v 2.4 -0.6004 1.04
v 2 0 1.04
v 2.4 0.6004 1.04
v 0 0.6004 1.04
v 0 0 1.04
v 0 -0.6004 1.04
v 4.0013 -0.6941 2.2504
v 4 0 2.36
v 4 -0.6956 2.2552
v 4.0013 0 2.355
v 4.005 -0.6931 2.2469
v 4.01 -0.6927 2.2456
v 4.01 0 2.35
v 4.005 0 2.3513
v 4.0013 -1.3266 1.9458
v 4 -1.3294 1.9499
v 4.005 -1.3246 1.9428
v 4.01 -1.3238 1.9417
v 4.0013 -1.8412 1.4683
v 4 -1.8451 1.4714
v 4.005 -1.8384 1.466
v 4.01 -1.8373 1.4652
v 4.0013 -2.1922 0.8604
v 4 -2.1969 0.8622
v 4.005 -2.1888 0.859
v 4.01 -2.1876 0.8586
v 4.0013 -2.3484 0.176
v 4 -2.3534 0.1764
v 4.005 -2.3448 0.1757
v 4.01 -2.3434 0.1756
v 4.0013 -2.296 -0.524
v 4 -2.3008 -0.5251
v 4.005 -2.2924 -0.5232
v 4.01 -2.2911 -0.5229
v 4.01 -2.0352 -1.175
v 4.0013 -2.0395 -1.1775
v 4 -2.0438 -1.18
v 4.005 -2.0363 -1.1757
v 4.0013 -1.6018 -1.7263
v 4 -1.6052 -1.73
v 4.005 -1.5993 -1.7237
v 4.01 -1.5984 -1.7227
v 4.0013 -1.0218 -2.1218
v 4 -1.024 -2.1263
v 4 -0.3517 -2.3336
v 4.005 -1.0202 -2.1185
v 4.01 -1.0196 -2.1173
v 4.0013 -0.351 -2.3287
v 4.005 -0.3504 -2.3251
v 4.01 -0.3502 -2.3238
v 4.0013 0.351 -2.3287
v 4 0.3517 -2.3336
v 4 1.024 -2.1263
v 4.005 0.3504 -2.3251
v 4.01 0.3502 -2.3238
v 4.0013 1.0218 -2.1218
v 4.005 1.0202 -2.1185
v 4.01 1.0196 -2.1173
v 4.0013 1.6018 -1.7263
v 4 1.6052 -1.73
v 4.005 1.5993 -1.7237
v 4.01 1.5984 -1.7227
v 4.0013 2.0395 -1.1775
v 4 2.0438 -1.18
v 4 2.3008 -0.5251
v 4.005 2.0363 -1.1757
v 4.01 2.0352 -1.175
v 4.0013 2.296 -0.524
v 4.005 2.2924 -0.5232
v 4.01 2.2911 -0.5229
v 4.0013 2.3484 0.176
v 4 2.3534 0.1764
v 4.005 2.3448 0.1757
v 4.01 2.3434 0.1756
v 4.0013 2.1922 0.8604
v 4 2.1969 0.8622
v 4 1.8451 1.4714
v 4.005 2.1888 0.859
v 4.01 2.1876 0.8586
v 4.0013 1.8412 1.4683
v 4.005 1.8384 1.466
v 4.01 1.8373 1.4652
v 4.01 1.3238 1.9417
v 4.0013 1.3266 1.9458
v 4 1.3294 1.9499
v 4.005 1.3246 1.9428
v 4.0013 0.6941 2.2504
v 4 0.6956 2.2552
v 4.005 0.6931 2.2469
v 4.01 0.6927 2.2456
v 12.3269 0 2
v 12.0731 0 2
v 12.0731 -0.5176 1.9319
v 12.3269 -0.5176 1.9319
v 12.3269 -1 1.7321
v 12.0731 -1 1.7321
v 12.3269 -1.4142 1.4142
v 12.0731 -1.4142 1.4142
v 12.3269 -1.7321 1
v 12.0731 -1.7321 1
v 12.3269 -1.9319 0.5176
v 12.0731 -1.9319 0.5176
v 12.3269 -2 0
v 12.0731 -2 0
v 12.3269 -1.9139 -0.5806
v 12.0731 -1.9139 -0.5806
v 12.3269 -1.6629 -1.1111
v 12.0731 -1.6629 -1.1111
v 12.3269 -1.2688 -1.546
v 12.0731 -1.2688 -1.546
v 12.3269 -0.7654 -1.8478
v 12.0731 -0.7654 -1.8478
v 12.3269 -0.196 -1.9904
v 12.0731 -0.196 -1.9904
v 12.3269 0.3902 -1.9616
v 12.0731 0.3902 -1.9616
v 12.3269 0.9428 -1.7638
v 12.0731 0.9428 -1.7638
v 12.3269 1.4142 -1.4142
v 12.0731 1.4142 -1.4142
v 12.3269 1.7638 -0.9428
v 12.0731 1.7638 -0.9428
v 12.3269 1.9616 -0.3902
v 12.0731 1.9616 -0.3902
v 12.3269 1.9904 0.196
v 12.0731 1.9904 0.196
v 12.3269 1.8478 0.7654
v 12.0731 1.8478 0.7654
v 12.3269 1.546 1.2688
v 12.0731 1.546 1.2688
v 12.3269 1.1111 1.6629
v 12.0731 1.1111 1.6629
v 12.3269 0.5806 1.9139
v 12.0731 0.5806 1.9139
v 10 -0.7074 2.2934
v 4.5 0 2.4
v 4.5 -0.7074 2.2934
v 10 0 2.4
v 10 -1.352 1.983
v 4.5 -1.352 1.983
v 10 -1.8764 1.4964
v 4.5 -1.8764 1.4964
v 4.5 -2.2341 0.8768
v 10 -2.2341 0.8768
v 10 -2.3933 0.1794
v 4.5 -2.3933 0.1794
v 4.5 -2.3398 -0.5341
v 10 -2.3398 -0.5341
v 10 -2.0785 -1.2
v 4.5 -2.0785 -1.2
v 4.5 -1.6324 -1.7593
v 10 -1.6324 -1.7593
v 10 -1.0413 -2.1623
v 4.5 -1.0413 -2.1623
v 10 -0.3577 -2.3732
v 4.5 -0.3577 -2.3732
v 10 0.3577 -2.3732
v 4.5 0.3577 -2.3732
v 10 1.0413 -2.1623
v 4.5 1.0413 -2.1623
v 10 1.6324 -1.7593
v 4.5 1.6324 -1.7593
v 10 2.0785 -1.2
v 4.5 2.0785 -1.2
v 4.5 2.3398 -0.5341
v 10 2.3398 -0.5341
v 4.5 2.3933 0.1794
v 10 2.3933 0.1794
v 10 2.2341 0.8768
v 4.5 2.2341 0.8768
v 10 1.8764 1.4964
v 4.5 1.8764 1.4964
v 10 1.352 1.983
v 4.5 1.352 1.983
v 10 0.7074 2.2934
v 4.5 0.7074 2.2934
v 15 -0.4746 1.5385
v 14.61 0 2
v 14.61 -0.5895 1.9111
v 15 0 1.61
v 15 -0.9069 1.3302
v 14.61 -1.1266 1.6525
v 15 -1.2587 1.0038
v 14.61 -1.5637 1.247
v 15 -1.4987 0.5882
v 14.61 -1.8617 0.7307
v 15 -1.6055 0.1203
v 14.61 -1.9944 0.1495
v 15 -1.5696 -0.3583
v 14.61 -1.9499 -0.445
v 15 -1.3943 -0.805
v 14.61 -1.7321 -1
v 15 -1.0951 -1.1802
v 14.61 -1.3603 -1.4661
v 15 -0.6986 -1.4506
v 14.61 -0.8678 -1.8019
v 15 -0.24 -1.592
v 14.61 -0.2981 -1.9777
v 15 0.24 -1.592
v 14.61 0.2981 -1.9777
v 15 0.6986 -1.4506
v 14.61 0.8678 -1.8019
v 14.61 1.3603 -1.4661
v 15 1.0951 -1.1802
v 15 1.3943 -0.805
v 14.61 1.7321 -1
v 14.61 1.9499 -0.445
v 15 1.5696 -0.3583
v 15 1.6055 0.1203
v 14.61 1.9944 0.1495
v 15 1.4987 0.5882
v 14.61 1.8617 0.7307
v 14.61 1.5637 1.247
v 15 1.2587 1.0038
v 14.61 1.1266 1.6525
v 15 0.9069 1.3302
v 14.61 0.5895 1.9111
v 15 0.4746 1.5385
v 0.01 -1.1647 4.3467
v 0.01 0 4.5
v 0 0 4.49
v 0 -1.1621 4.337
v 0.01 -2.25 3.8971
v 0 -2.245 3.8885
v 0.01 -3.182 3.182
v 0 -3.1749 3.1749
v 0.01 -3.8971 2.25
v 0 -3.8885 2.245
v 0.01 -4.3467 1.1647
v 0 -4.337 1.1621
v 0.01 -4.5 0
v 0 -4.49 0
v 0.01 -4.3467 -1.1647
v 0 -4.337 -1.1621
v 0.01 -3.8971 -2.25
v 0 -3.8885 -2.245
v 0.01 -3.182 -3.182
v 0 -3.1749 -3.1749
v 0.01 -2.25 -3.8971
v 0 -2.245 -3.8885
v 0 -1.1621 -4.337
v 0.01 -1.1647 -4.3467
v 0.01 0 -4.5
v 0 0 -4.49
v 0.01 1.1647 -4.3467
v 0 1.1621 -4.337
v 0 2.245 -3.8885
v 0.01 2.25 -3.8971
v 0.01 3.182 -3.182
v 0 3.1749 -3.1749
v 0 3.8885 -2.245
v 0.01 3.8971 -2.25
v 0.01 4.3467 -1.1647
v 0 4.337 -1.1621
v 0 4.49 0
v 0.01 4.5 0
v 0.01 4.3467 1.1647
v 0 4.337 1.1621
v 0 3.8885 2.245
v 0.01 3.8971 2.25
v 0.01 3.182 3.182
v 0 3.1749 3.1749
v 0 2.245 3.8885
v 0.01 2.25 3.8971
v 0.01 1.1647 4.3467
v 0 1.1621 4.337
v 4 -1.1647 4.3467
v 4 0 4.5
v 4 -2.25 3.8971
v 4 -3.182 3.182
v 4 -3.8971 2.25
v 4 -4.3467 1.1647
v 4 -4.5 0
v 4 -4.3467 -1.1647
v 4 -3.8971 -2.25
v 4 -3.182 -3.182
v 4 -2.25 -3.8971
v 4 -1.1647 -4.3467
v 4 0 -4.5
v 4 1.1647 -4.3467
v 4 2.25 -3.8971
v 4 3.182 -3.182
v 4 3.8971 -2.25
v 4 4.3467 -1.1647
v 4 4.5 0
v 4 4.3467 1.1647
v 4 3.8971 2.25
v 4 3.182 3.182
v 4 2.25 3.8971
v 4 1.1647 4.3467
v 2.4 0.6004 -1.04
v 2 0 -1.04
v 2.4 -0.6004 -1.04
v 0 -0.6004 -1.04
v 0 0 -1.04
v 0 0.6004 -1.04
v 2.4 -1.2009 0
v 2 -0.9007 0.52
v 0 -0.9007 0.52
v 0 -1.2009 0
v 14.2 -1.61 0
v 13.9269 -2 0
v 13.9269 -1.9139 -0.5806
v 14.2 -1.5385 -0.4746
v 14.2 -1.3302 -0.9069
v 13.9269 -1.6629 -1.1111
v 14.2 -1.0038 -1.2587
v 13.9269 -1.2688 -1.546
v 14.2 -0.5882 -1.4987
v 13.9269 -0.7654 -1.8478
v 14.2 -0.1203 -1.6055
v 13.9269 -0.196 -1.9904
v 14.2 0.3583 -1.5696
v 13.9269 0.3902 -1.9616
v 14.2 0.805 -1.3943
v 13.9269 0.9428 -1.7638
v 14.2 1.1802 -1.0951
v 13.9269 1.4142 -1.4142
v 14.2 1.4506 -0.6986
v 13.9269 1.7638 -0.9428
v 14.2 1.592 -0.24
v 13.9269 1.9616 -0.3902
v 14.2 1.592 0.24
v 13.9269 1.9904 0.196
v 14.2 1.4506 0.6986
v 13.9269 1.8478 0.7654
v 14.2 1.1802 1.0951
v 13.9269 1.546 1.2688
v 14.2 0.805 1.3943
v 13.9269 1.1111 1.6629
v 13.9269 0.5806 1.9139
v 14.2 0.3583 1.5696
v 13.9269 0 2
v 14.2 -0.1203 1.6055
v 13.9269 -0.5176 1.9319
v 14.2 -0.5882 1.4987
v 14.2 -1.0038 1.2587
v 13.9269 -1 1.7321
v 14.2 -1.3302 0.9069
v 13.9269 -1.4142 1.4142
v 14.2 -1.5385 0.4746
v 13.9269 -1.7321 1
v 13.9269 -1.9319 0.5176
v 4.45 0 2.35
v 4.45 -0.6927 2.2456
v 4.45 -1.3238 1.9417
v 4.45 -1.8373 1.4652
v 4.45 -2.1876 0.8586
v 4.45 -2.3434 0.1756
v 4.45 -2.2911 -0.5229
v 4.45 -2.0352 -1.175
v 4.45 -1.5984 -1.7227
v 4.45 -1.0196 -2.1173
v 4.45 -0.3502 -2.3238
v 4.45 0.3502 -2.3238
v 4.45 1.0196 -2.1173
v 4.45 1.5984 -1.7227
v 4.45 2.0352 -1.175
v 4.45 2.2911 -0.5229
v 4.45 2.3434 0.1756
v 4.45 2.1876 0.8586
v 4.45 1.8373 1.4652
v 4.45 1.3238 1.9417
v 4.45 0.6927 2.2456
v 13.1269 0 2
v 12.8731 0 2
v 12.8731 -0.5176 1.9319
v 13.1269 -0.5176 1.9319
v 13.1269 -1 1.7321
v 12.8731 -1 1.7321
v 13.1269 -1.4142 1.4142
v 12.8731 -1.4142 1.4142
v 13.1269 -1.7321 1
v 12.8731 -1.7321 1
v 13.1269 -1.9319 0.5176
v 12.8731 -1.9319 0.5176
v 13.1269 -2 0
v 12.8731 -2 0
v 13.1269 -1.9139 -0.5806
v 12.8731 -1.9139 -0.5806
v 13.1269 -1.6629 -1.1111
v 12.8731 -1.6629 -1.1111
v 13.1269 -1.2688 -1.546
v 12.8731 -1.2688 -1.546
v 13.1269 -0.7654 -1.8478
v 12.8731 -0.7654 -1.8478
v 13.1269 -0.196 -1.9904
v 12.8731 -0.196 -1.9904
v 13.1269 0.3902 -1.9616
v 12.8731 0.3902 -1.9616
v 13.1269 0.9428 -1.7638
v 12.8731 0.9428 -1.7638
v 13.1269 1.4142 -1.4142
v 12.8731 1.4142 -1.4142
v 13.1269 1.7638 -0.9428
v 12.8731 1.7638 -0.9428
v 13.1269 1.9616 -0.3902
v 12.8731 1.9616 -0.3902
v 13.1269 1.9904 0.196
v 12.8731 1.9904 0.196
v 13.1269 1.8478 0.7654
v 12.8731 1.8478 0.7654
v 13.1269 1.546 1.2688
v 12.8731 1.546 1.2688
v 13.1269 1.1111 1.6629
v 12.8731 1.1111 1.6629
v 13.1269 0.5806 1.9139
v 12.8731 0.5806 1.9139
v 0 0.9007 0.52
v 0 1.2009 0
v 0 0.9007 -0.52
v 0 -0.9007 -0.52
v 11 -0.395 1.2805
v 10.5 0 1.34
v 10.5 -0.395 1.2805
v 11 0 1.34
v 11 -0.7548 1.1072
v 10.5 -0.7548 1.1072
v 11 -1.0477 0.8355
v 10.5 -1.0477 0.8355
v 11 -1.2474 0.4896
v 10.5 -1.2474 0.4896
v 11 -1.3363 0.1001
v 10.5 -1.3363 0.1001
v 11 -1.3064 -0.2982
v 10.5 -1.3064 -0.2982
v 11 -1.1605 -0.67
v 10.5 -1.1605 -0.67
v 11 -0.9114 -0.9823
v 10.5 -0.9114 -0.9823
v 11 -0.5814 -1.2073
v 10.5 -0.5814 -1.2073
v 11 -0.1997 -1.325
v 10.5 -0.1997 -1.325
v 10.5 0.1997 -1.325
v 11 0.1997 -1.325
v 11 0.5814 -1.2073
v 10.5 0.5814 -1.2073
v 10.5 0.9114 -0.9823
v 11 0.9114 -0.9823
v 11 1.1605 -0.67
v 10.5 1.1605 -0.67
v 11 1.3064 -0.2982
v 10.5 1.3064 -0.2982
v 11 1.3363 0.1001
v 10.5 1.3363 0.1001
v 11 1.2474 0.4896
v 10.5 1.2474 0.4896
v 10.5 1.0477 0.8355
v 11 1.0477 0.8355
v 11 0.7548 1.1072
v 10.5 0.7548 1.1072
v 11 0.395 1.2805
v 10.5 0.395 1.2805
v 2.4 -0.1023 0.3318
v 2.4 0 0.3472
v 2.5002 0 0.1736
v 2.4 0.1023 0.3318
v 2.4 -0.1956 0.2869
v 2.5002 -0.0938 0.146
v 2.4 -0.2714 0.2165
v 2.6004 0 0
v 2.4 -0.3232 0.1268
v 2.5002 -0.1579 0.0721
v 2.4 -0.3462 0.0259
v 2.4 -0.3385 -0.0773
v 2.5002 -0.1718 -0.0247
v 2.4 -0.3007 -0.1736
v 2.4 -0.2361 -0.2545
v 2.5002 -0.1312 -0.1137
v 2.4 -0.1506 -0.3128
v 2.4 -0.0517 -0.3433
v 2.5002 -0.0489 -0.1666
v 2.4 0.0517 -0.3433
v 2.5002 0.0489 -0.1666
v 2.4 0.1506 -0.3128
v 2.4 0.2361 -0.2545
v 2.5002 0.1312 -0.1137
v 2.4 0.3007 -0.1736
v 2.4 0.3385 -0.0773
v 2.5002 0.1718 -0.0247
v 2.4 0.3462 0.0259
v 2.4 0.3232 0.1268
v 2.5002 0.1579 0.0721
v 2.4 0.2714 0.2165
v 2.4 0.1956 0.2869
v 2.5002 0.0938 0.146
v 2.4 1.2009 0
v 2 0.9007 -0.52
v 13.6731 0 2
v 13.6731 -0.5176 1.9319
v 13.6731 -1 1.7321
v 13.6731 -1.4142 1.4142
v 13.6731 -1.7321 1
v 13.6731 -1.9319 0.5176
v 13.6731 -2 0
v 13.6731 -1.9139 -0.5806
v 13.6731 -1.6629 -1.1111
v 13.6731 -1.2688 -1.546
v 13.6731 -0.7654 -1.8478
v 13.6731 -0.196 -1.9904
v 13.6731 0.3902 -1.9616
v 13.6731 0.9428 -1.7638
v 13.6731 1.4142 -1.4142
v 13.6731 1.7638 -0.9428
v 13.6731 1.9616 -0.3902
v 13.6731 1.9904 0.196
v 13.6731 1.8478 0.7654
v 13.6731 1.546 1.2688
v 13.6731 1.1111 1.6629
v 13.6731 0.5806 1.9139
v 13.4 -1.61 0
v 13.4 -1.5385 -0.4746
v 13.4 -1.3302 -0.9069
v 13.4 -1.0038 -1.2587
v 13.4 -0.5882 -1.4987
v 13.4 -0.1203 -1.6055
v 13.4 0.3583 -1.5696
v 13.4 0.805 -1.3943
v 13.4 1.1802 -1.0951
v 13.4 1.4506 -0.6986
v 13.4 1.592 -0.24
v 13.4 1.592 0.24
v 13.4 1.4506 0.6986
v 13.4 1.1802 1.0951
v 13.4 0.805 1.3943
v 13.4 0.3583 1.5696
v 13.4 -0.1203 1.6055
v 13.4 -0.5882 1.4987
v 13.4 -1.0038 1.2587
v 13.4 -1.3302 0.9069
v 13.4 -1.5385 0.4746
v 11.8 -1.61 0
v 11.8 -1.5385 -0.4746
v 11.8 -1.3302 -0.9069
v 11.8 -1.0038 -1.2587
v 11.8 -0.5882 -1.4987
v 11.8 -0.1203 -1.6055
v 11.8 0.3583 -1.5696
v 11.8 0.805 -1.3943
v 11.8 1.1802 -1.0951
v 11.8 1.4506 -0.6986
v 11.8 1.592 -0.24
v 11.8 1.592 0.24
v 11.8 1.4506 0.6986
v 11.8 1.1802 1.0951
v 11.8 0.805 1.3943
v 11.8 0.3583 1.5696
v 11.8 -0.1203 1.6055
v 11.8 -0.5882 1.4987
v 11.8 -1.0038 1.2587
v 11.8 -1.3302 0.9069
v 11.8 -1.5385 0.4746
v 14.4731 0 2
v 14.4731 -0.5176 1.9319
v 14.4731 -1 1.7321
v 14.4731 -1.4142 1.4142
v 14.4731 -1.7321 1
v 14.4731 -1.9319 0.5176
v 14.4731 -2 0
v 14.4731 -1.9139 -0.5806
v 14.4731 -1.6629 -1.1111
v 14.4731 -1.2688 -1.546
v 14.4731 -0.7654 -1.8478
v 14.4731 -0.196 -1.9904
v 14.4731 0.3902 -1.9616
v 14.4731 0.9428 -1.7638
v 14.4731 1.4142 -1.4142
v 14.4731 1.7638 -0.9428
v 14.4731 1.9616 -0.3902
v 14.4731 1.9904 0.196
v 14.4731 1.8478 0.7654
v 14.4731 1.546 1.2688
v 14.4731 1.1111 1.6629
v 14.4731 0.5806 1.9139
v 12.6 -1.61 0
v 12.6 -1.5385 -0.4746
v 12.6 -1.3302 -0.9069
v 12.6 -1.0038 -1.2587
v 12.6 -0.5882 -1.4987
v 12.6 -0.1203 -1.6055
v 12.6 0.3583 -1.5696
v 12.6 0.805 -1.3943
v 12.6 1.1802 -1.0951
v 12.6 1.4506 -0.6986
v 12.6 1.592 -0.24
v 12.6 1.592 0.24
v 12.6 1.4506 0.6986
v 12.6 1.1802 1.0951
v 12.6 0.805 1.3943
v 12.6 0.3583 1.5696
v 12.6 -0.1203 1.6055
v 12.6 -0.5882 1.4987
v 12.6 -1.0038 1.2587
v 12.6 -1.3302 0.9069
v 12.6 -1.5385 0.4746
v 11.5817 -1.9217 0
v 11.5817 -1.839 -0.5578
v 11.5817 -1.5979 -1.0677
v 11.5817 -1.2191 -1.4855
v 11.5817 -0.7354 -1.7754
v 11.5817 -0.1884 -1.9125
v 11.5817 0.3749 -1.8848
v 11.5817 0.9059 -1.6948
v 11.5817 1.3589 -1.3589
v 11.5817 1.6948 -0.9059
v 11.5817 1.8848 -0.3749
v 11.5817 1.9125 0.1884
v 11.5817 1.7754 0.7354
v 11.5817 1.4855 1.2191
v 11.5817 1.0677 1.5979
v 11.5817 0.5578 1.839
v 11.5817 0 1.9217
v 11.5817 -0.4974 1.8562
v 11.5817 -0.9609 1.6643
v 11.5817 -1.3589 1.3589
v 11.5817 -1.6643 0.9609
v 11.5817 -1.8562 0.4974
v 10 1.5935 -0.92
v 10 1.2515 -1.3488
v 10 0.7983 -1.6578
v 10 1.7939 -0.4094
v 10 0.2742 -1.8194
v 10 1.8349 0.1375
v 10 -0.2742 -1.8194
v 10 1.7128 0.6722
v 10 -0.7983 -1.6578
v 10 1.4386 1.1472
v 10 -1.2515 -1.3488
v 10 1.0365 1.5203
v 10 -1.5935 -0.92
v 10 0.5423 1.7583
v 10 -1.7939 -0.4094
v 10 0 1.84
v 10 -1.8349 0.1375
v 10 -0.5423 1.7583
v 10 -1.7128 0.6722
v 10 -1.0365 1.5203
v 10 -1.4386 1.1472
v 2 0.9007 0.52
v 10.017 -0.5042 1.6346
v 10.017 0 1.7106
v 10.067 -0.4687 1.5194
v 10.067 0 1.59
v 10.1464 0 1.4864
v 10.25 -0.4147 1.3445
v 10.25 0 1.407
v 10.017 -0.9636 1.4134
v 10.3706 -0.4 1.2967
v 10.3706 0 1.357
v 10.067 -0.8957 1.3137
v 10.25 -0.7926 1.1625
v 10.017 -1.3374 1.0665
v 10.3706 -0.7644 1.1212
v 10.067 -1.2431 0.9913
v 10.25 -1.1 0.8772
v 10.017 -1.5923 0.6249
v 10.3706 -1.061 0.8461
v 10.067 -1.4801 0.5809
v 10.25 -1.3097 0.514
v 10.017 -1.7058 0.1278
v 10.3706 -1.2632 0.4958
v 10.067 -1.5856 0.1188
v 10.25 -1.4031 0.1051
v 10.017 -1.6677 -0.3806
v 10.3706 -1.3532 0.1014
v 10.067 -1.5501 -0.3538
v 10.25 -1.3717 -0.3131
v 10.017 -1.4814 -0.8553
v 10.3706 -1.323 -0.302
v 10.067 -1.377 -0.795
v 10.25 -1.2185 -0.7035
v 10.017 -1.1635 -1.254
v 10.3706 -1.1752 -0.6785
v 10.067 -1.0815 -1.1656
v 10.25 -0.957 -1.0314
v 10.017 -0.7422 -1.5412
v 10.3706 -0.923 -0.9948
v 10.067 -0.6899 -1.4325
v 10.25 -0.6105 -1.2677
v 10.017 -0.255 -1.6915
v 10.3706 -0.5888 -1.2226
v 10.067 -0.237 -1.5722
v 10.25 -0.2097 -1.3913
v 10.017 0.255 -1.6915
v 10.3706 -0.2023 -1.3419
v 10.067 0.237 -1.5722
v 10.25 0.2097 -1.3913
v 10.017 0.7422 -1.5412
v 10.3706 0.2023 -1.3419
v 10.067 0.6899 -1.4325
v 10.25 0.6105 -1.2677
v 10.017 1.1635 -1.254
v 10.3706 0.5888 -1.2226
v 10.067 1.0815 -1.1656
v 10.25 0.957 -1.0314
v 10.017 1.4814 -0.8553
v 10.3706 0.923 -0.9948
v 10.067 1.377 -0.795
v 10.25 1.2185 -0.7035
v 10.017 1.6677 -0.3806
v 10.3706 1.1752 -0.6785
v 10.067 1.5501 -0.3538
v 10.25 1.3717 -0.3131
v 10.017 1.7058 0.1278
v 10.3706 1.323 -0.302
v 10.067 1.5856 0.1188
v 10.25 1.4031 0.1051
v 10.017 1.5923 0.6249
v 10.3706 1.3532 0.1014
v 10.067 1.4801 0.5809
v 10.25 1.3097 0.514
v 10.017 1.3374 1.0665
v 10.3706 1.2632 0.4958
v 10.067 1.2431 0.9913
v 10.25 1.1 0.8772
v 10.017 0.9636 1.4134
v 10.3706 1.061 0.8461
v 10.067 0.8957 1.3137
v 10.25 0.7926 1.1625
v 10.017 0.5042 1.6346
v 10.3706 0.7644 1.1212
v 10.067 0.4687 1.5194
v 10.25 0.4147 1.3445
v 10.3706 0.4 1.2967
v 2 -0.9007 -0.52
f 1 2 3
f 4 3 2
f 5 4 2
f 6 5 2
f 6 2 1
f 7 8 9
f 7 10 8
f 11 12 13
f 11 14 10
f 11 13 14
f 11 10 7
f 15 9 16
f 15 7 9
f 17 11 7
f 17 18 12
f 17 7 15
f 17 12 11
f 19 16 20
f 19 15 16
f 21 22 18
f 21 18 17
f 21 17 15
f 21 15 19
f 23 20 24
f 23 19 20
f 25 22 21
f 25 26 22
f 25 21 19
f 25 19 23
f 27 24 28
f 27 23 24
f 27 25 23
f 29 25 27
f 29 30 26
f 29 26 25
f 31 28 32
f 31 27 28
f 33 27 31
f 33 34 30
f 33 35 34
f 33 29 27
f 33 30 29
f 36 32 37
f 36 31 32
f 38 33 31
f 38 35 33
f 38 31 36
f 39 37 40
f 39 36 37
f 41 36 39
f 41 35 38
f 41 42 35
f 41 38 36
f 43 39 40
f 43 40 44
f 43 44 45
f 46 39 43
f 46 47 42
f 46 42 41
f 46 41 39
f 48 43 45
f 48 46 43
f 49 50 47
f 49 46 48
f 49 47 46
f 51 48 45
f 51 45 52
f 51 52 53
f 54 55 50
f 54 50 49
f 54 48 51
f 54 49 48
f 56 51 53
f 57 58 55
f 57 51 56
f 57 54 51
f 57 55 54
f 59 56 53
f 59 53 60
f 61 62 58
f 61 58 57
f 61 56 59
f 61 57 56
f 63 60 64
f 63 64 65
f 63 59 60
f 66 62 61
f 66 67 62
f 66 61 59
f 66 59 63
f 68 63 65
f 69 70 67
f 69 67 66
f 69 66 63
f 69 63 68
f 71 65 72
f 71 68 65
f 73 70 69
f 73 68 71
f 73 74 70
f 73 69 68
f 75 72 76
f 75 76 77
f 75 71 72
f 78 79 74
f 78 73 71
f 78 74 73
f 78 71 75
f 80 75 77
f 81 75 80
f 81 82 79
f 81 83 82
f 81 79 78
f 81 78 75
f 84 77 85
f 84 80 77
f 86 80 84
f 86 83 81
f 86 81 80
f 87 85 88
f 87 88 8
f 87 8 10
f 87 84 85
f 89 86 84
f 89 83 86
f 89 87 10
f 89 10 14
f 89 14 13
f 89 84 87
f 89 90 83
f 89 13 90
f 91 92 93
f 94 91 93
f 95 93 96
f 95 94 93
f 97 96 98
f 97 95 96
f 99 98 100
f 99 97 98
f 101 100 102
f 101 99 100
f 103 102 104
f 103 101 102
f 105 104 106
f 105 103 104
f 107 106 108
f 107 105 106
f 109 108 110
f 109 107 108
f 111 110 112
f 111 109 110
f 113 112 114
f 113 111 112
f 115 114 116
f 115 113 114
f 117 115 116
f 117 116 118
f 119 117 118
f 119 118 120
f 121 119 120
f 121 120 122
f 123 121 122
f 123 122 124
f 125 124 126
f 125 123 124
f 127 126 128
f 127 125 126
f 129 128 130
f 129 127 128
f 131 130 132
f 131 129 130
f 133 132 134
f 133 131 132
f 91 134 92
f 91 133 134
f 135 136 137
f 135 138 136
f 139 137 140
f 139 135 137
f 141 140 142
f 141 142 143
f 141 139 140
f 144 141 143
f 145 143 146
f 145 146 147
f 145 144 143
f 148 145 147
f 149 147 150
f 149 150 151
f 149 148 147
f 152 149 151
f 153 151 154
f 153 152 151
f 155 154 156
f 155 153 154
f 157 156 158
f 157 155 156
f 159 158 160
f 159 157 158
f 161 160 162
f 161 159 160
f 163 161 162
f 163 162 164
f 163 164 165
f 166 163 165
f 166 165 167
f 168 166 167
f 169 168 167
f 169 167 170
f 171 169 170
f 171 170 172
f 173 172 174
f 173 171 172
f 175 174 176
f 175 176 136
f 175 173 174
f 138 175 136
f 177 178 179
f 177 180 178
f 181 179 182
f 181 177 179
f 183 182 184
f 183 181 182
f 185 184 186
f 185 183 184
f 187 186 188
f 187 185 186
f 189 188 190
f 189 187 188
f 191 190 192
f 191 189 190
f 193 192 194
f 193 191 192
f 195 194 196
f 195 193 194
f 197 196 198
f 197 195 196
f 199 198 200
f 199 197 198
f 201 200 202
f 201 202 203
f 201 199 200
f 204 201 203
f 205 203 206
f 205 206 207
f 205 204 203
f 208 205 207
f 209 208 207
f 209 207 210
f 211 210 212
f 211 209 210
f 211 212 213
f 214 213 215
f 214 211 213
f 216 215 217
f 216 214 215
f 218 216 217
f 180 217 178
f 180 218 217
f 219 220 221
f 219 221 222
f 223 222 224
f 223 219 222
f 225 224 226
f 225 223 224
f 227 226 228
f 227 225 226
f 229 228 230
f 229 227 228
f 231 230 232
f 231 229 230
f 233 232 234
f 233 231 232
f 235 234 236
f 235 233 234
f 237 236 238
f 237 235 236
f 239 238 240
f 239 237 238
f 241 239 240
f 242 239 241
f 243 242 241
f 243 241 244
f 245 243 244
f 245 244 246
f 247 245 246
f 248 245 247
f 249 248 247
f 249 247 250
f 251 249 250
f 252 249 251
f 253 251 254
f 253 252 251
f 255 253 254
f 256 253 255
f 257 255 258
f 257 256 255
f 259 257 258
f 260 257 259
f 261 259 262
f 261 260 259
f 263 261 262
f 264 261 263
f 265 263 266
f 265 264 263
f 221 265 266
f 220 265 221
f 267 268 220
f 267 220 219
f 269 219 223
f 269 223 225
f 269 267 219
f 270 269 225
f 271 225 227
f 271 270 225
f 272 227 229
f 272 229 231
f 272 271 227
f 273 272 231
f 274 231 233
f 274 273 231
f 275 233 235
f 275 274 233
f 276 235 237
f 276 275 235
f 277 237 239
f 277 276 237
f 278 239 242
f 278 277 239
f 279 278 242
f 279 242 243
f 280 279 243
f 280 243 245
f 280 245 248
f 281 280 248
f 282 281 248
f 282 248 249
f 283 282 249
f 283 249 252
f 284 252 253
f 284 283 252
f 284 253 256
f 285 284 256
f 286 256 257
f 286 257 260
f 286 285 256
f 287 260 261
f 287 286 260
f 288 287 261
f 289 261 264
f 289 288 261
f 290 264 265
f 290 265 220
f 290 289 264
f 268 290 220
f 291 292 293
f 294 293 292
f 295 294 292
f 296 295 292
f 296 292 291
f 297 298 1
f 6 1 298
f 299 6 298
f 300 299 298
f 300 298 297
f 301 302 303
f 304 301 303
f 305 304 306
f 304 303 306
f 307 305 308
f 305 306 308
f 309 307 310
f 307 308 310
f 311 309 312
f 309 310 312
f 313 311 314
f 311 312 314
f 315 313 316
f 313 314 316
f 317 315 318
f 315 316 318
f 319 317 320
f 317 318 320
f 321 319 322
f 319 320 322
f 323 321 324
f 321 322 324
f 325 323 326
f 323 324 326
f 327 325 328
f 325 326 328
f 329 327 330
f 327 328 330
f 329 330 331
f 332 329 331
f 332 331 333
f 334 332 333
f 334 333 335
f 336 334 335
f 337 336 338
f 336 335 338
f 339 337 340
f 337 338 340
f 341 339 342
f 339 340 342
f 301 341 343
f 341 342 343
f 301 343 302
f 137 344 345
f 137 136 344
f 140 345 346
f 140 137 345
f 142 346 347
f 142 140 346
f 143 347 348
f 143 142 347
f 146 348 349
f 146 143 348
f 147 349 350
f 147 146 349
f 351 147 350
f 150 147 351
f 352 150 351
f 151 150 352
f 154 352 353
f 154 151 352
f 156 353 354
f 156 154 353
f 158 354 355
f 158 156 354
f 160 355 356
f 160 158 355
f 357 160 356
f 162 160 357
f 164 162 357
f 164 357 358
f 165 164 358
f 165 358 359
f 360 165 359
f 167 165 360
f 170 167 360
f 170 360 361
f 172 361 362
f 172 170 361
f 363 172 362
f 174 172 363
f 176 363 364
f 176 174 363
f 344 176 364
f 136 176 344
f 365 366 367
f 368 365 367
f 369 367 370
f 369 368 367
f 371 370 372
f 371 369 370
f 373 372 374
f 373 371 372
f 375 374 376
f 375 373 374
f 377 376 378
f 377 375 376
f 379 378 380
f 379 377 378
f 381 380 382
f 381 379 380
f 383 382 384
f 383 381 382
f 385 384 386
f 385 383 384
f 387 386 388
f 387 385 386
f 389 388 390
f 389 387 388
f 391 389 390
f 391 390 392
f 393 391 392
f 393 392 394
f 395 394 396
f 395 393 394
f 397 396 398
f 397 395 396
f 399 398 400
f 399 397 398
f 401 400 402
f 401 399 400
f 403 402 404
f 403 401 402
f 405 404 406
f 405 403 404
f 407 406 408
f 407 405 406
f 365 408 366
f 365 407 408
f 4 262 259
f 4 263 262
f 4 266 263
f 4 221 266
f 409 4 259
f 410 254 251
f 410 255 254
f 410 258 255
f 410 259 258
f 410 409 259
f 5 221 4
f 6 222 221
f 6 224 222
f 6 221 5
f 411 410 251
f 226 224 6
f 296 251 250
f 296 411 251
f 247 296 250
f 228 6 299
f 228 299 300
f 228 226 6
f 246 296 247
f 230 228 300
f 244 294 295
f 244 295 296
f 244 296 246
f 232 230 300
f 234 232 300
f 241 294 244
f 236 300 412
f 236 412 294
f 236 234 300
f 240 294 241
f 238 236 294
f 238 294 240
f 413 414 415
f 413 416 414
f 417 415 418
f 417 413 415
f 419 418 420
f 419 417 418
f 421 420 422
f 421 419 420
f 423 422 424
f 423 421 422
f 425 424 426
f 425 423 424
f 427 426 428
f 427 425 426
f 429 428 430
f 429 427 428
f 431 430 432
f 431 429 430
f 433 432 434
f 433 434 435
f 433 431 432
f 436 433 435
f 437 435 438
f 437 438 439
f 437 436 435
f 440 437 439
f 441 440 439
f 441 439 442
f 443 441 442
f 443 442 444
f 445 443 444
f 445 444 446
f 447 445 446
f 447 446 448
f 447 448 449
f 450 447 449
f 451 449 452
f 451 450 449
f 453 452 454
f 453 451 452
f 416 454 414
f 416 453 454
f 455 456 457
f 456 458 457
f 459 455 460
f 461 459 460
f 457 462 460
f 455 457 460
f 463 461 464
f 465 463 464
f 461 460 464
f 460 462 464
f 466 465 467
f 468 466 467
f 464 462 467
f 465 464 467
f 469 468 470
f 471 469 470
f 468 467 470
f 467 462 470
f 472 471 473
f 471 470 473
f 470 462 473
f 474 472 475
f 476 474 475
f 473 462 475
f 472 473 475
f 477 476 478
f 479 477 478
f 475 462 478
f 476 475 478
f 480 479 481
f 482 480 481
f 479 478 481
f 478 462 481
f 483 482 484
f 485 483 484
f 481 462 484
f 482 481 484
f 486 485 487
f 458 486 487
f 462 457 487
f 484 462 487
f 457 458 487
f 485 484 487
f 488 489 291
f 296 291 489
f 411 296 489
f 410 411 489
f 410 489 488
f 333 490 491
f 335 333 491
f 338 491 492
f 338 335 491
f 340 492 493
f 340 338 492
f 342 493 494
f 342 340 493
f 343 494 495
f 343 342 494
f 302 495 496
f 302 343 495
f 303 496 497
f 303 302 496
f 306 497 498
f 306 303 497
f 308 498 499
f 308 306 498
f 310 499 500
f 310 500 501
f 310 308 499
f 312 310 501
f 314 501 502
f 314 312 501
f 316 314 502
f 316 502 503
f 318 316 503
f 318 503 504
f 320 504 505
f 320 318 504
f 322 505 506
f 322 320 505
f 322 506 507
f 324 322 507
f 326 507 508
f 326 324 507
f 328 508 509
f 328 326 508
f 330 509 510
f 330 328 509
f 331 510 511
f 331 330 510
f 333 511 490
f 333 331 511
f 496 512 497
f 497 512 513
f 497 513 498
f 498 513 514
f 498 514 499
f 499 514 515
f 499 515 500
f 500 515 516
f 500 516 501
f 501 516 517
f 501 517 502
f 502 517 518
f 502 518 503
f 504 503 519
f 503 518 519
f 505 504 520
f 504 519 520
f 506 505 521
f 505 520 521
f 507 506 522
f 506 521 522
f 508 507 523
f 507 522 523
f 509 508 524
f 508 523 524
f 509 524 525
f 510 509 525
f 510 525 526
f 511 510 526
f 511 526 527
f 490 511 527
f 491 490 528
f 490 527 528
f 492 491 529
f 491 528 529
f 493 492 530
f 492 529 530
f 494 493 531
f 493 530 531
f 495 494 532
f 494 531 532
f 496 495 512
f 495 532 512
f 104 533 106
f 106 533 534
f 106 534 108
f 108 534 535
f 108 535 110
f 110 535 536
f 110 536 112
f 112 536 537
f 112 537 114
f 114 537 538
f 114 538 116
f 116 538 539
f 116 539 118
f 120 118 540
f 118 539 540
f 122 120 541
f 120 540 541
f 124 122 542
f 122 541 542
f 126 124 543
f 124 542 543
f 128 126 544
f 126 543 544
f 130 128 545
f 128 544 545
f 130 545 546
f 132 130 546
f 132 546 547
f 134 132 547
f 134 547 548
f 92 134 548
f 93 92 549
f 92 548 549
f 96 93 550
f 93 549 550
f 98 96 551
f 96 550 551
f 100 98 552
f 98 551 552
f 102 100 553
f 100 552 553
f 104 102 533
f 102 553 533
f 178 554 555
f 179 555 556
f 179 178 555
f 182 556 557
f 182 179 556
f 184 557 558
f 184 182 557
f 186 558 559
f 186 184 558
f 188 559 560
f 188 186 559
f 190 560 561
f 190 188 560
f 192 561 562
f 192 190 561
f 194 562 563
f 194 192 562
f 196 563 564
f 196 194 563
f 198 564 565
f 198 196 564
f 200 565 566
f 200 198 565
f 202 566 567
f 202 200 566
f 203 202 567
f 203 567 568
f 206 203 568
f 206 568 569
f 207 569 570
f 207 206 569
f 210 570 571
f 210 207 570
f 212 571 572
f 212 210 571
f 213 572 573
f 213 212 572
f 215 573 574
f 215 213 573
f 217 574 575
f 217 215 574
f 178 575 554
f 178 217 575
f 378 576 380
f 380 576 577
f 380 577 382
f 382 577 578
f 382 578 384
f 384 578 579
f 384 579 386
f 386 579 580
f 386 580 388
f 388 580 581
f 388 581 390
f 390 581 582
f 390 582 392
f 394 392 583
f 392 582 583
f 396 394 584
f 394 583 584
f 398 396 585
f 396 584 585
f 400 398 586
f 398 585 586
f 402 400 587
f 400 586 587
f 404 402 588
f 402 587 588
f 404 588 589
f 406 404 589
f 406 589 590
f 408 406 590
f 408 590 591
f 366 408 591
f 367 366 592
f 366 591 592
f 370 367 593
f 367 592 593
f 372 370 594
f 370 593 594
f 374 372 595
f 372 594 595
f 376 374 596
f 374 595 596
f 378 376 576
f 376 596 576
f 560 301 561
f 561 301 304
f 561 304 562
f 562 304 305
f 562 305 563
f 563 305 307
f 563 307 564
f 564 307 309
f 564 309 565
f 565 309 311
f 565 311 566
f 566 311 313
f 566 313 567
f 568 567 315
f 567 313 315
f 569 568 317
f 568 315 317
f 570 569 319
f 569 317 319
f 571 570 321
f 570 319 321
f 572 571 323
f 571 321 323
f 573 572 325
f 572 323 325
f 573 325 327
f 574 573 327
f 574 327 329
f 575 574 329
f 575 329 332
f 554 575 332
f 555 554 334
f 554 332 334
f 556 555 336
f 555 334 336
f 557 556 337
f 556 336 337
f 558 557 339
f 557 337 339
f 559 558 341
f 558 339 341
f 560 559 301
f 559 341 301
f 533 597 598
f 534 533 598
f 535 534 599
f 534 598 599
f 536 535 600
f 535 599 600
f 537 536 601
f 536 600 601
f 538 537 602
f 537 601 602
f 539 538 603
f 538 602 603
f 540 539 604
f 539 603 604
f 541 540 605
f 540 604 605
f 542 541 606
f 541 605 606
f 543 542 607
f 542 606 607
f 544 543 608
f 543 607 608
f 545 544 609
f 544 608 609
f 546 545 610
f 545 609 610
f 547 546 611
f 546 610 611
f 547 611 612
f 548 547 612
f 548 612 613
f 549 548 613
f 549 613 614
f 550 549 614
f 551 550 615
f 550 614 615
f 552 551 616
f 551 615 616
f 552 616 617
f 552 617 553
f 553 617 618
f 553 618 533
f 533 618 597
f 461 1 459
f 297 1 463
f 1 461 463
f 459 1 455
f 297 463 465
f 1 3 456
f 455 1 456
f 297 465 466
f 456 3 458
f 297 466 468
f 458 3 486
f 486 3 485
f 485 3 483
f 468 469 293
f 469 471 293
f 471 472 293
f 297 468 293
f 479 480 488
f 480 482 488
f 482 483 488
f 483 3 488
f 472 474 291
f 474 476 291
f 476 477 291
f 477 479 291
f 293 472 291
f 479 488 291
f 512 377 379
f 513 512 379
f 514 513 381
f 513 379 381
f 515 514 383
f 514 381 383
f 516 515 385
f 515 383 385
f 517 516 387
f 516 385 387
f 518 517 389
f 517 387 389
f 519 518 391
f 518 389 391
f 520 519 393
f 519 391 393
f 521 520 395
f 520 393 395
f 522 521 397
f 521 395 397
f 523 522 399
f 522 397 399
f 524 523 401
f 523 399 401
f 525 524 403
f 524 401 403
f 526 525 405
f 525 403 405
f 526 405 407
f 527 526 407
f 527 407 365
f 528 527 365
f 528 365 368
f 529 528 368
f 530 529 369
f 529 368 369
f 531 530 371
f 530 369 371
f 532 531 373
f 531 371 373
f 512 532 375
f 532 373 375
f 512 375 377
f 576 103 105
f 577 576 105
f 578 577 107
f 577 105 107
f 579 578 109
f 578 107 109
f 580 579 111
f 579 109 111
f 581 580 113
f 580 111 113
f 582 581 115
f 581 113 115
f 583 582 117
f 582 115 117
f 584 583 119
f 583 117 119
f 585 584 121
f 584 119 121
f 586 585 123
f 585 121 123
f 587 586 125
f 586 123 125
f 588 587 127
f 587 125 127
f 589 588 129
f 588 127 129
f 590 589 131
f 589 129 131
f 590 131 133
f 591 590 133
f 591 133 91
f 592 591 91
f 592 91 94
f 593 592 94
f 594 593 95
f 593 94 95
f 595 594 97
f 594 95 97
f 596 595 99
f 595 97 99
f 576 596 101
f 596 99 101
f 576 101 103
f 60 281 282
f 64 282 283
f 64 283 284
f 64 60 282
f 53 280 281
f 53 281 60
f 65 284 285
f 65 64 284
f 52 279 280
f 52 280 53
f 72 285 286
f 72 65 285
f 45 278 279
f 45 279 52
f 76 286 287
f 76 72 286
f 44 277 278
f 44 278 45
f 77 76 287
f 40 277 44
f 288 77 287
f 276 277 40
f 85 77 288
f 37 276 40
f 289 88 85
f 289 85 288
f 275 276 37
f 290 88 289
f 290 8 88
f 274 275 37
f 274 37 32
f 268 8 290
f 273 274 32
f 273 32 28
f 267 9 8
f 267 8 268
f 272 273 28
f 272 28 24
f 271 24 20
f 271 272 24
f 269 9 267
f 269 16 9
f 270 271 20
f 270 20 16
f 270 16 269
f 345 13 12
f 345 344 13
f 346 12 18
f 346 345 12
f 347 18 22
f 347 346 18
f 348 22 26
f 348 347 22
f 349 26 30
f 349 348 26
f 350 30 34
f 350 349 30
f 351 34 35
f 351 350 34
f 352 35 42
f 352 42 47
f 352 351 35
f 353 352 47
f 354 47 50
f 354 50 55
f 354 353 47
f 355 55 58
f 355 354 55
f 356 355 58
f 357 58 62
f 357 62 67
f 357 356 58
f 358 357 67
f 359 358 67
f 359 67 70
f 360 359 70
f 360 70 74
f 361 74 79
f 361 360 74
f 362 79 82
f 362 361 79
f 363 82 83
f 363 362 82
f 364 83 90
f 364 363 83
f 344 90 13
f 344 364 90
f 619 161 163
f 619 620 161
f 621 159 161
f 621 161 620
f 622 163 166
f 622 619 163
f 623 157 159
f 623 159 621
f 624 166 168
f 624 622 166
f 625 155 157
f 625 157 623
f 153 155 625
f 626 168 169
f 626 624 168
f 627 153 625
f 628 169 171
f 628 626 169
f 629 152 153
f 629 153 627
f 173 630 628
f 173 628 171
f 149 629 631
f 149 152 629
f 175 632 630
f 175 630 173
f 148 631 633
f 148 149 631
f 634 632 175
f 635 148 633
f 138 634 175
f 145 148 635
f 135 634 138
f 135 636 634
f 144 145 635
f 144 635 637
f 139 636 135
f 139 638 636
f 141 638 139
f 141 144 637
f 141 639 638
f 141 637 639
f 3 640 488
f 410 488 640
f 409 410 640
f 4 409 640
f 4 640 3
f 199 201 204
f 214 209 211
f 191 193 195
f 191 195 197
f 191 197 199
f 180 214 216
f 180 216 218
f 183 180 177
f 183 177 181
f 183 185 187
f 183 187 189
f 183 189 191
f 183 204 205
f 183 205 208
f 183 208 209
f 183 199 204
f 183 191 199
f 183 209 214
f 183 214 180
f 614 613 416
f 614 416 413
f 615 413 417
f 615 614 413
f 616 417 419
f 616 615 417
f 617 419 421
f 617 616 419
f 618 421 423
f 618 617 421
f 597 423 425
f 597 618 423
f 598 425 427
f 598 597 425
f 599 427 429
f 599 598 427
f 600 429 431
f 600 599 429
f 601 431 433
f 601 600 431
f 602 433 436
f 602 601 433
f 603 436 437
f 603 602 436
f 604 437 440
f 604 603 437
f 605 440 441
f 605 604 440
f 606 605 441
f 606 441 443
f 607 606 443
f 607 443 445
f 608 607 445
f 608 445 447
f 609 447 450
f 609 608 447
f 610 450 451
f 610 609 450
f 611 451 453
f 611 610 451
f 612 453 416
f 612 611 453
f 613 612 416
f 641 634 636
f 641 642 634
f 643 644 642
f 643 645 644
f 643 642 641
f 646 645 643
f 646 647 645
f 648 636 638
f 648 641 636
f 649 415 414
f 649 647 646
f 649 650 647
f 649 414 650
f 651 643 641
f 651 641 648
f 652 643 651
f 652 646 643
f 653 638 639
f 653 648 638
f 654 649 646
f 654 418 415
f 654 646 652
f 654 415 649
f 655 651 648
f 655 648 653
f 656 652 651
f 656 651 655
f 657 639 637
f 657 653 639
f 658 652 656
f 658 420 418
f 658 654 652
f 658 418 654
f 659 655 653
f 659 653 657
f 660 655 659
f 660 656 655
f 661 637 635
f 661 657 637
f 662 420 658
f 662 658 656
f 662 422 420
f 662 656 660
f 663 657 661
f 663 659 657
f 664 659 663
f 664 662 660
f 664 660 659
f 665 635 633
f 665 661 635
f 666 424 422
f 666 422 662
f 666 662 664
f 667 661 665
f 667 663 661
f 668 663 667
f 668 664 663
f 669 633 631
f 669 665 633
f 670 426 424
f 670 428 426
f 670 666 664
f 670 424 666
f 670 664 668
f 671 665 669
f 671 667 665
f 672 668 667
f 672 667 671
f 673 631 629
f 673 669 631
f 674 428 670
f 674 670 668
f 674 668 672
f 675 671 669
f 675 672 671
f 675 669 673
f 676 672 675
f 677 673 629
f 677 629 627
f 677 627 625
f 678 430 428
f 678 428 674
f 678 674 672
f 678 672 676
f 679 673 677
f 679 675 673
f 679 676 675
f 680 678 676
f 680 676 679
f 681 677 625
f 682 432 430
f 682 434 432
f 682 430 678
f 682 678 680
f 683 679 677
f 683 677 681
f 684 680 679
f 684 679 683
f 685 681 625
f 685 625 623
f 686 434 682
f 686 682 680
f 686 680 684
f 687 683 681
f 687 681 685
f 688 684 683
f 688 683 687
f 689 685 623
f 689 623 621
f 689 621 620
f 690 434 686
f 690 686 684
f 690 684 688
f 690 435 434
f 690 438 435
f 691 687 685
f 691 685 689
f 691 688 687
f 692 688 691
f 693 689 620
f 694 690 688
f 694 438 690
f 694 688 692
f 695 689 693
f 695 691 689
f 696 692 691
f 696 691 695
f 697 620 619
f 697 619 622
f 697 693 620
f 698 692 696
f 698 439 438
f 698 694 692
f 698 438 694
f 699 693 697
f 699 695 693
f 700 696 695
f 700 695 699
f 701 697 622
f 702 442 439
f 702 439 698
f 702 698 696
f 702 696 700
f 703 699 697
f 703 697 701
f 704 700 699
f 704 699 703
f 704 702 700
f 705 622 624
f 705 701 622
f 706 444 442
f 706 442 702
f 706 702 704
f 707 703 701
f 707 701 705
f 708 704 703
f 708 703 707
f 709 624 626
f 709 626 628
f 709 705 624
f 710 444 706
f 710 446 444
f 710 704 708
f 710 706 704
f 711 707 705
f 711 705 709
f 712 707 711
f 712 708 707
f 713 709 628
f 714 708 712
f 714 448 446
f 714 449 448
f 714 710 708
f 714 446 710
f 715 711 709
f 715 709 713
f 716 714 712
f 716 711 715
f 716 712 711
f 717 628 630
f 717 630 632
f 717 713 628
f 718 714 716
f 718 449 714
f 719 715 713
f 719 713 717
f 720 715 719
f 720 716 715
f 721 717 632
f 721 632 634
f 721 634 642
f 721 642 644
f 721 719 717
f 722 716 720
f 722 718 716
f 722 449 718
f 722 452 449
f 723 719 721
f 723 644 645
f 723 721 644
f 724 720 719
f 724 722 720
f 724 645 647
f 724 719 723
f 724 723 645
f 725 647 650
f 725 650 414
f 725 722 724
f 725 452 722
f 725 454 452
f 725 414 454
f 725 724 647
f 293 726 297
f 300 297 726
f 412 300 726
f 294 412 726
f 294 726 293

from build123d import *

# Parameters (mm, degrees)
CHAMFER1_SIZE   = 0.01
HEX_2_DEPTH     = 2.4
THDSCHPAT_COUNT = 4
THDSCHPAT_PITCH = 0.8


with BuildPart() as part:
    # BodySke → BaseBody (revolve)
    with BuildSketch(Plane.XY, mode=Mode.PRIVATE) as basebody_sk:
        with BuildLine():
            Line((0, 0), (0, 4.5))
            Line((0, 4.5), (4, 4.5))
            Line((4, 4.5), (4, 2.36))
            ThreePointArc((4, 2.36), (4.002928932, 2.352928932), (4.01, 2.35))
            Line((4.01, 2.35), (4.45, 2.35))
            Line((4.45, 2.35), (4.5, 2.4))
            Line((4.5, 2.4), (10, 2.4))
            Line((10, 2.4), (10, 1.84))
            ThreePointArc((10, 1.84), (10.146446609, 1.486446609), (10.5, 1.34))
            Line((10.5, 1.34), (11, 1.34))
            Line((11, 1.34), (11.66, 2))
            Line((11.66, 2), (14.61, 2))
            Line((14.61, 2), (15, 1.61))
            Line((15, 1.61), (15, 0))
            Line((15, 0), (0, 0))
        make_face()
    revolve(basebody_sk.sketch.rotate(Axis((-6.35, 0, 0), (1, 0, 0)), 90), axis=Axis((-6.35, 0, 0), (1, 0, 0)))

    # Chamfer1
    chamfer1_edges = [part.edges().sort_by_distance(p)[0] for p in [
        (0, 0, -4.5),
    ]]
    chamfer(chamfer1_edges, length=CHAMFER1_SIZE)

    # Sketch2 → PreBroach (revolve, cut)
    with BuildSketch(Plane.XY, mode=Mode.PRIVATE) as prebroach_sk:
        Polygon((0, 1.04), (2, 1.04), (2.60044428, 0), (0, 0), align=None)
    revolve(prebroach_sk.sketch.rotate(Axis((0, 0, 0), (1, 0, 0)), 90), axis=Axis((0, 0, 0), (1, 0, 0)), mode=Mode.SUBTRACT)

    # Sketch3 → Hex 2 (cut)
    with BuildSketch(Plane.ZY):
        Polygon((-1.04, -0.60044428), (-1.04, 0.60044428), (0, 1.20088856), (1.04, 0.60044428), (1.04, -0.60044428), (0, -1.20088856), align=None)
    extrude(amount=-HEX_2_DEPTH, mode=Mode.SUBTRACT)

    # ThdSchSke → ThreadSchematic (revolve, cut)
    with BuildSketch(Plane.XY):
        Polygon((11.8, -1.61), (11.246836045, -2.4), (11.246836045, -3), (12.353163955, -3), (12.353163955, -2.4), align=None)
    threadschematic = revolve(axis=Axis((-3.175, 0, 0), (1, 0, 0)), mode=Mode.SUBTRACT)

    # ThdSchPat: ThreadSchematic ×4
    with Locations(*[(i * THDSCHPAT_PITCH, 0, 0) for i in range(1, THDSCHPAT_COUNT)]):
        add(threadschematic, mode=Mode.SUBTRACT)


solid = part.part
